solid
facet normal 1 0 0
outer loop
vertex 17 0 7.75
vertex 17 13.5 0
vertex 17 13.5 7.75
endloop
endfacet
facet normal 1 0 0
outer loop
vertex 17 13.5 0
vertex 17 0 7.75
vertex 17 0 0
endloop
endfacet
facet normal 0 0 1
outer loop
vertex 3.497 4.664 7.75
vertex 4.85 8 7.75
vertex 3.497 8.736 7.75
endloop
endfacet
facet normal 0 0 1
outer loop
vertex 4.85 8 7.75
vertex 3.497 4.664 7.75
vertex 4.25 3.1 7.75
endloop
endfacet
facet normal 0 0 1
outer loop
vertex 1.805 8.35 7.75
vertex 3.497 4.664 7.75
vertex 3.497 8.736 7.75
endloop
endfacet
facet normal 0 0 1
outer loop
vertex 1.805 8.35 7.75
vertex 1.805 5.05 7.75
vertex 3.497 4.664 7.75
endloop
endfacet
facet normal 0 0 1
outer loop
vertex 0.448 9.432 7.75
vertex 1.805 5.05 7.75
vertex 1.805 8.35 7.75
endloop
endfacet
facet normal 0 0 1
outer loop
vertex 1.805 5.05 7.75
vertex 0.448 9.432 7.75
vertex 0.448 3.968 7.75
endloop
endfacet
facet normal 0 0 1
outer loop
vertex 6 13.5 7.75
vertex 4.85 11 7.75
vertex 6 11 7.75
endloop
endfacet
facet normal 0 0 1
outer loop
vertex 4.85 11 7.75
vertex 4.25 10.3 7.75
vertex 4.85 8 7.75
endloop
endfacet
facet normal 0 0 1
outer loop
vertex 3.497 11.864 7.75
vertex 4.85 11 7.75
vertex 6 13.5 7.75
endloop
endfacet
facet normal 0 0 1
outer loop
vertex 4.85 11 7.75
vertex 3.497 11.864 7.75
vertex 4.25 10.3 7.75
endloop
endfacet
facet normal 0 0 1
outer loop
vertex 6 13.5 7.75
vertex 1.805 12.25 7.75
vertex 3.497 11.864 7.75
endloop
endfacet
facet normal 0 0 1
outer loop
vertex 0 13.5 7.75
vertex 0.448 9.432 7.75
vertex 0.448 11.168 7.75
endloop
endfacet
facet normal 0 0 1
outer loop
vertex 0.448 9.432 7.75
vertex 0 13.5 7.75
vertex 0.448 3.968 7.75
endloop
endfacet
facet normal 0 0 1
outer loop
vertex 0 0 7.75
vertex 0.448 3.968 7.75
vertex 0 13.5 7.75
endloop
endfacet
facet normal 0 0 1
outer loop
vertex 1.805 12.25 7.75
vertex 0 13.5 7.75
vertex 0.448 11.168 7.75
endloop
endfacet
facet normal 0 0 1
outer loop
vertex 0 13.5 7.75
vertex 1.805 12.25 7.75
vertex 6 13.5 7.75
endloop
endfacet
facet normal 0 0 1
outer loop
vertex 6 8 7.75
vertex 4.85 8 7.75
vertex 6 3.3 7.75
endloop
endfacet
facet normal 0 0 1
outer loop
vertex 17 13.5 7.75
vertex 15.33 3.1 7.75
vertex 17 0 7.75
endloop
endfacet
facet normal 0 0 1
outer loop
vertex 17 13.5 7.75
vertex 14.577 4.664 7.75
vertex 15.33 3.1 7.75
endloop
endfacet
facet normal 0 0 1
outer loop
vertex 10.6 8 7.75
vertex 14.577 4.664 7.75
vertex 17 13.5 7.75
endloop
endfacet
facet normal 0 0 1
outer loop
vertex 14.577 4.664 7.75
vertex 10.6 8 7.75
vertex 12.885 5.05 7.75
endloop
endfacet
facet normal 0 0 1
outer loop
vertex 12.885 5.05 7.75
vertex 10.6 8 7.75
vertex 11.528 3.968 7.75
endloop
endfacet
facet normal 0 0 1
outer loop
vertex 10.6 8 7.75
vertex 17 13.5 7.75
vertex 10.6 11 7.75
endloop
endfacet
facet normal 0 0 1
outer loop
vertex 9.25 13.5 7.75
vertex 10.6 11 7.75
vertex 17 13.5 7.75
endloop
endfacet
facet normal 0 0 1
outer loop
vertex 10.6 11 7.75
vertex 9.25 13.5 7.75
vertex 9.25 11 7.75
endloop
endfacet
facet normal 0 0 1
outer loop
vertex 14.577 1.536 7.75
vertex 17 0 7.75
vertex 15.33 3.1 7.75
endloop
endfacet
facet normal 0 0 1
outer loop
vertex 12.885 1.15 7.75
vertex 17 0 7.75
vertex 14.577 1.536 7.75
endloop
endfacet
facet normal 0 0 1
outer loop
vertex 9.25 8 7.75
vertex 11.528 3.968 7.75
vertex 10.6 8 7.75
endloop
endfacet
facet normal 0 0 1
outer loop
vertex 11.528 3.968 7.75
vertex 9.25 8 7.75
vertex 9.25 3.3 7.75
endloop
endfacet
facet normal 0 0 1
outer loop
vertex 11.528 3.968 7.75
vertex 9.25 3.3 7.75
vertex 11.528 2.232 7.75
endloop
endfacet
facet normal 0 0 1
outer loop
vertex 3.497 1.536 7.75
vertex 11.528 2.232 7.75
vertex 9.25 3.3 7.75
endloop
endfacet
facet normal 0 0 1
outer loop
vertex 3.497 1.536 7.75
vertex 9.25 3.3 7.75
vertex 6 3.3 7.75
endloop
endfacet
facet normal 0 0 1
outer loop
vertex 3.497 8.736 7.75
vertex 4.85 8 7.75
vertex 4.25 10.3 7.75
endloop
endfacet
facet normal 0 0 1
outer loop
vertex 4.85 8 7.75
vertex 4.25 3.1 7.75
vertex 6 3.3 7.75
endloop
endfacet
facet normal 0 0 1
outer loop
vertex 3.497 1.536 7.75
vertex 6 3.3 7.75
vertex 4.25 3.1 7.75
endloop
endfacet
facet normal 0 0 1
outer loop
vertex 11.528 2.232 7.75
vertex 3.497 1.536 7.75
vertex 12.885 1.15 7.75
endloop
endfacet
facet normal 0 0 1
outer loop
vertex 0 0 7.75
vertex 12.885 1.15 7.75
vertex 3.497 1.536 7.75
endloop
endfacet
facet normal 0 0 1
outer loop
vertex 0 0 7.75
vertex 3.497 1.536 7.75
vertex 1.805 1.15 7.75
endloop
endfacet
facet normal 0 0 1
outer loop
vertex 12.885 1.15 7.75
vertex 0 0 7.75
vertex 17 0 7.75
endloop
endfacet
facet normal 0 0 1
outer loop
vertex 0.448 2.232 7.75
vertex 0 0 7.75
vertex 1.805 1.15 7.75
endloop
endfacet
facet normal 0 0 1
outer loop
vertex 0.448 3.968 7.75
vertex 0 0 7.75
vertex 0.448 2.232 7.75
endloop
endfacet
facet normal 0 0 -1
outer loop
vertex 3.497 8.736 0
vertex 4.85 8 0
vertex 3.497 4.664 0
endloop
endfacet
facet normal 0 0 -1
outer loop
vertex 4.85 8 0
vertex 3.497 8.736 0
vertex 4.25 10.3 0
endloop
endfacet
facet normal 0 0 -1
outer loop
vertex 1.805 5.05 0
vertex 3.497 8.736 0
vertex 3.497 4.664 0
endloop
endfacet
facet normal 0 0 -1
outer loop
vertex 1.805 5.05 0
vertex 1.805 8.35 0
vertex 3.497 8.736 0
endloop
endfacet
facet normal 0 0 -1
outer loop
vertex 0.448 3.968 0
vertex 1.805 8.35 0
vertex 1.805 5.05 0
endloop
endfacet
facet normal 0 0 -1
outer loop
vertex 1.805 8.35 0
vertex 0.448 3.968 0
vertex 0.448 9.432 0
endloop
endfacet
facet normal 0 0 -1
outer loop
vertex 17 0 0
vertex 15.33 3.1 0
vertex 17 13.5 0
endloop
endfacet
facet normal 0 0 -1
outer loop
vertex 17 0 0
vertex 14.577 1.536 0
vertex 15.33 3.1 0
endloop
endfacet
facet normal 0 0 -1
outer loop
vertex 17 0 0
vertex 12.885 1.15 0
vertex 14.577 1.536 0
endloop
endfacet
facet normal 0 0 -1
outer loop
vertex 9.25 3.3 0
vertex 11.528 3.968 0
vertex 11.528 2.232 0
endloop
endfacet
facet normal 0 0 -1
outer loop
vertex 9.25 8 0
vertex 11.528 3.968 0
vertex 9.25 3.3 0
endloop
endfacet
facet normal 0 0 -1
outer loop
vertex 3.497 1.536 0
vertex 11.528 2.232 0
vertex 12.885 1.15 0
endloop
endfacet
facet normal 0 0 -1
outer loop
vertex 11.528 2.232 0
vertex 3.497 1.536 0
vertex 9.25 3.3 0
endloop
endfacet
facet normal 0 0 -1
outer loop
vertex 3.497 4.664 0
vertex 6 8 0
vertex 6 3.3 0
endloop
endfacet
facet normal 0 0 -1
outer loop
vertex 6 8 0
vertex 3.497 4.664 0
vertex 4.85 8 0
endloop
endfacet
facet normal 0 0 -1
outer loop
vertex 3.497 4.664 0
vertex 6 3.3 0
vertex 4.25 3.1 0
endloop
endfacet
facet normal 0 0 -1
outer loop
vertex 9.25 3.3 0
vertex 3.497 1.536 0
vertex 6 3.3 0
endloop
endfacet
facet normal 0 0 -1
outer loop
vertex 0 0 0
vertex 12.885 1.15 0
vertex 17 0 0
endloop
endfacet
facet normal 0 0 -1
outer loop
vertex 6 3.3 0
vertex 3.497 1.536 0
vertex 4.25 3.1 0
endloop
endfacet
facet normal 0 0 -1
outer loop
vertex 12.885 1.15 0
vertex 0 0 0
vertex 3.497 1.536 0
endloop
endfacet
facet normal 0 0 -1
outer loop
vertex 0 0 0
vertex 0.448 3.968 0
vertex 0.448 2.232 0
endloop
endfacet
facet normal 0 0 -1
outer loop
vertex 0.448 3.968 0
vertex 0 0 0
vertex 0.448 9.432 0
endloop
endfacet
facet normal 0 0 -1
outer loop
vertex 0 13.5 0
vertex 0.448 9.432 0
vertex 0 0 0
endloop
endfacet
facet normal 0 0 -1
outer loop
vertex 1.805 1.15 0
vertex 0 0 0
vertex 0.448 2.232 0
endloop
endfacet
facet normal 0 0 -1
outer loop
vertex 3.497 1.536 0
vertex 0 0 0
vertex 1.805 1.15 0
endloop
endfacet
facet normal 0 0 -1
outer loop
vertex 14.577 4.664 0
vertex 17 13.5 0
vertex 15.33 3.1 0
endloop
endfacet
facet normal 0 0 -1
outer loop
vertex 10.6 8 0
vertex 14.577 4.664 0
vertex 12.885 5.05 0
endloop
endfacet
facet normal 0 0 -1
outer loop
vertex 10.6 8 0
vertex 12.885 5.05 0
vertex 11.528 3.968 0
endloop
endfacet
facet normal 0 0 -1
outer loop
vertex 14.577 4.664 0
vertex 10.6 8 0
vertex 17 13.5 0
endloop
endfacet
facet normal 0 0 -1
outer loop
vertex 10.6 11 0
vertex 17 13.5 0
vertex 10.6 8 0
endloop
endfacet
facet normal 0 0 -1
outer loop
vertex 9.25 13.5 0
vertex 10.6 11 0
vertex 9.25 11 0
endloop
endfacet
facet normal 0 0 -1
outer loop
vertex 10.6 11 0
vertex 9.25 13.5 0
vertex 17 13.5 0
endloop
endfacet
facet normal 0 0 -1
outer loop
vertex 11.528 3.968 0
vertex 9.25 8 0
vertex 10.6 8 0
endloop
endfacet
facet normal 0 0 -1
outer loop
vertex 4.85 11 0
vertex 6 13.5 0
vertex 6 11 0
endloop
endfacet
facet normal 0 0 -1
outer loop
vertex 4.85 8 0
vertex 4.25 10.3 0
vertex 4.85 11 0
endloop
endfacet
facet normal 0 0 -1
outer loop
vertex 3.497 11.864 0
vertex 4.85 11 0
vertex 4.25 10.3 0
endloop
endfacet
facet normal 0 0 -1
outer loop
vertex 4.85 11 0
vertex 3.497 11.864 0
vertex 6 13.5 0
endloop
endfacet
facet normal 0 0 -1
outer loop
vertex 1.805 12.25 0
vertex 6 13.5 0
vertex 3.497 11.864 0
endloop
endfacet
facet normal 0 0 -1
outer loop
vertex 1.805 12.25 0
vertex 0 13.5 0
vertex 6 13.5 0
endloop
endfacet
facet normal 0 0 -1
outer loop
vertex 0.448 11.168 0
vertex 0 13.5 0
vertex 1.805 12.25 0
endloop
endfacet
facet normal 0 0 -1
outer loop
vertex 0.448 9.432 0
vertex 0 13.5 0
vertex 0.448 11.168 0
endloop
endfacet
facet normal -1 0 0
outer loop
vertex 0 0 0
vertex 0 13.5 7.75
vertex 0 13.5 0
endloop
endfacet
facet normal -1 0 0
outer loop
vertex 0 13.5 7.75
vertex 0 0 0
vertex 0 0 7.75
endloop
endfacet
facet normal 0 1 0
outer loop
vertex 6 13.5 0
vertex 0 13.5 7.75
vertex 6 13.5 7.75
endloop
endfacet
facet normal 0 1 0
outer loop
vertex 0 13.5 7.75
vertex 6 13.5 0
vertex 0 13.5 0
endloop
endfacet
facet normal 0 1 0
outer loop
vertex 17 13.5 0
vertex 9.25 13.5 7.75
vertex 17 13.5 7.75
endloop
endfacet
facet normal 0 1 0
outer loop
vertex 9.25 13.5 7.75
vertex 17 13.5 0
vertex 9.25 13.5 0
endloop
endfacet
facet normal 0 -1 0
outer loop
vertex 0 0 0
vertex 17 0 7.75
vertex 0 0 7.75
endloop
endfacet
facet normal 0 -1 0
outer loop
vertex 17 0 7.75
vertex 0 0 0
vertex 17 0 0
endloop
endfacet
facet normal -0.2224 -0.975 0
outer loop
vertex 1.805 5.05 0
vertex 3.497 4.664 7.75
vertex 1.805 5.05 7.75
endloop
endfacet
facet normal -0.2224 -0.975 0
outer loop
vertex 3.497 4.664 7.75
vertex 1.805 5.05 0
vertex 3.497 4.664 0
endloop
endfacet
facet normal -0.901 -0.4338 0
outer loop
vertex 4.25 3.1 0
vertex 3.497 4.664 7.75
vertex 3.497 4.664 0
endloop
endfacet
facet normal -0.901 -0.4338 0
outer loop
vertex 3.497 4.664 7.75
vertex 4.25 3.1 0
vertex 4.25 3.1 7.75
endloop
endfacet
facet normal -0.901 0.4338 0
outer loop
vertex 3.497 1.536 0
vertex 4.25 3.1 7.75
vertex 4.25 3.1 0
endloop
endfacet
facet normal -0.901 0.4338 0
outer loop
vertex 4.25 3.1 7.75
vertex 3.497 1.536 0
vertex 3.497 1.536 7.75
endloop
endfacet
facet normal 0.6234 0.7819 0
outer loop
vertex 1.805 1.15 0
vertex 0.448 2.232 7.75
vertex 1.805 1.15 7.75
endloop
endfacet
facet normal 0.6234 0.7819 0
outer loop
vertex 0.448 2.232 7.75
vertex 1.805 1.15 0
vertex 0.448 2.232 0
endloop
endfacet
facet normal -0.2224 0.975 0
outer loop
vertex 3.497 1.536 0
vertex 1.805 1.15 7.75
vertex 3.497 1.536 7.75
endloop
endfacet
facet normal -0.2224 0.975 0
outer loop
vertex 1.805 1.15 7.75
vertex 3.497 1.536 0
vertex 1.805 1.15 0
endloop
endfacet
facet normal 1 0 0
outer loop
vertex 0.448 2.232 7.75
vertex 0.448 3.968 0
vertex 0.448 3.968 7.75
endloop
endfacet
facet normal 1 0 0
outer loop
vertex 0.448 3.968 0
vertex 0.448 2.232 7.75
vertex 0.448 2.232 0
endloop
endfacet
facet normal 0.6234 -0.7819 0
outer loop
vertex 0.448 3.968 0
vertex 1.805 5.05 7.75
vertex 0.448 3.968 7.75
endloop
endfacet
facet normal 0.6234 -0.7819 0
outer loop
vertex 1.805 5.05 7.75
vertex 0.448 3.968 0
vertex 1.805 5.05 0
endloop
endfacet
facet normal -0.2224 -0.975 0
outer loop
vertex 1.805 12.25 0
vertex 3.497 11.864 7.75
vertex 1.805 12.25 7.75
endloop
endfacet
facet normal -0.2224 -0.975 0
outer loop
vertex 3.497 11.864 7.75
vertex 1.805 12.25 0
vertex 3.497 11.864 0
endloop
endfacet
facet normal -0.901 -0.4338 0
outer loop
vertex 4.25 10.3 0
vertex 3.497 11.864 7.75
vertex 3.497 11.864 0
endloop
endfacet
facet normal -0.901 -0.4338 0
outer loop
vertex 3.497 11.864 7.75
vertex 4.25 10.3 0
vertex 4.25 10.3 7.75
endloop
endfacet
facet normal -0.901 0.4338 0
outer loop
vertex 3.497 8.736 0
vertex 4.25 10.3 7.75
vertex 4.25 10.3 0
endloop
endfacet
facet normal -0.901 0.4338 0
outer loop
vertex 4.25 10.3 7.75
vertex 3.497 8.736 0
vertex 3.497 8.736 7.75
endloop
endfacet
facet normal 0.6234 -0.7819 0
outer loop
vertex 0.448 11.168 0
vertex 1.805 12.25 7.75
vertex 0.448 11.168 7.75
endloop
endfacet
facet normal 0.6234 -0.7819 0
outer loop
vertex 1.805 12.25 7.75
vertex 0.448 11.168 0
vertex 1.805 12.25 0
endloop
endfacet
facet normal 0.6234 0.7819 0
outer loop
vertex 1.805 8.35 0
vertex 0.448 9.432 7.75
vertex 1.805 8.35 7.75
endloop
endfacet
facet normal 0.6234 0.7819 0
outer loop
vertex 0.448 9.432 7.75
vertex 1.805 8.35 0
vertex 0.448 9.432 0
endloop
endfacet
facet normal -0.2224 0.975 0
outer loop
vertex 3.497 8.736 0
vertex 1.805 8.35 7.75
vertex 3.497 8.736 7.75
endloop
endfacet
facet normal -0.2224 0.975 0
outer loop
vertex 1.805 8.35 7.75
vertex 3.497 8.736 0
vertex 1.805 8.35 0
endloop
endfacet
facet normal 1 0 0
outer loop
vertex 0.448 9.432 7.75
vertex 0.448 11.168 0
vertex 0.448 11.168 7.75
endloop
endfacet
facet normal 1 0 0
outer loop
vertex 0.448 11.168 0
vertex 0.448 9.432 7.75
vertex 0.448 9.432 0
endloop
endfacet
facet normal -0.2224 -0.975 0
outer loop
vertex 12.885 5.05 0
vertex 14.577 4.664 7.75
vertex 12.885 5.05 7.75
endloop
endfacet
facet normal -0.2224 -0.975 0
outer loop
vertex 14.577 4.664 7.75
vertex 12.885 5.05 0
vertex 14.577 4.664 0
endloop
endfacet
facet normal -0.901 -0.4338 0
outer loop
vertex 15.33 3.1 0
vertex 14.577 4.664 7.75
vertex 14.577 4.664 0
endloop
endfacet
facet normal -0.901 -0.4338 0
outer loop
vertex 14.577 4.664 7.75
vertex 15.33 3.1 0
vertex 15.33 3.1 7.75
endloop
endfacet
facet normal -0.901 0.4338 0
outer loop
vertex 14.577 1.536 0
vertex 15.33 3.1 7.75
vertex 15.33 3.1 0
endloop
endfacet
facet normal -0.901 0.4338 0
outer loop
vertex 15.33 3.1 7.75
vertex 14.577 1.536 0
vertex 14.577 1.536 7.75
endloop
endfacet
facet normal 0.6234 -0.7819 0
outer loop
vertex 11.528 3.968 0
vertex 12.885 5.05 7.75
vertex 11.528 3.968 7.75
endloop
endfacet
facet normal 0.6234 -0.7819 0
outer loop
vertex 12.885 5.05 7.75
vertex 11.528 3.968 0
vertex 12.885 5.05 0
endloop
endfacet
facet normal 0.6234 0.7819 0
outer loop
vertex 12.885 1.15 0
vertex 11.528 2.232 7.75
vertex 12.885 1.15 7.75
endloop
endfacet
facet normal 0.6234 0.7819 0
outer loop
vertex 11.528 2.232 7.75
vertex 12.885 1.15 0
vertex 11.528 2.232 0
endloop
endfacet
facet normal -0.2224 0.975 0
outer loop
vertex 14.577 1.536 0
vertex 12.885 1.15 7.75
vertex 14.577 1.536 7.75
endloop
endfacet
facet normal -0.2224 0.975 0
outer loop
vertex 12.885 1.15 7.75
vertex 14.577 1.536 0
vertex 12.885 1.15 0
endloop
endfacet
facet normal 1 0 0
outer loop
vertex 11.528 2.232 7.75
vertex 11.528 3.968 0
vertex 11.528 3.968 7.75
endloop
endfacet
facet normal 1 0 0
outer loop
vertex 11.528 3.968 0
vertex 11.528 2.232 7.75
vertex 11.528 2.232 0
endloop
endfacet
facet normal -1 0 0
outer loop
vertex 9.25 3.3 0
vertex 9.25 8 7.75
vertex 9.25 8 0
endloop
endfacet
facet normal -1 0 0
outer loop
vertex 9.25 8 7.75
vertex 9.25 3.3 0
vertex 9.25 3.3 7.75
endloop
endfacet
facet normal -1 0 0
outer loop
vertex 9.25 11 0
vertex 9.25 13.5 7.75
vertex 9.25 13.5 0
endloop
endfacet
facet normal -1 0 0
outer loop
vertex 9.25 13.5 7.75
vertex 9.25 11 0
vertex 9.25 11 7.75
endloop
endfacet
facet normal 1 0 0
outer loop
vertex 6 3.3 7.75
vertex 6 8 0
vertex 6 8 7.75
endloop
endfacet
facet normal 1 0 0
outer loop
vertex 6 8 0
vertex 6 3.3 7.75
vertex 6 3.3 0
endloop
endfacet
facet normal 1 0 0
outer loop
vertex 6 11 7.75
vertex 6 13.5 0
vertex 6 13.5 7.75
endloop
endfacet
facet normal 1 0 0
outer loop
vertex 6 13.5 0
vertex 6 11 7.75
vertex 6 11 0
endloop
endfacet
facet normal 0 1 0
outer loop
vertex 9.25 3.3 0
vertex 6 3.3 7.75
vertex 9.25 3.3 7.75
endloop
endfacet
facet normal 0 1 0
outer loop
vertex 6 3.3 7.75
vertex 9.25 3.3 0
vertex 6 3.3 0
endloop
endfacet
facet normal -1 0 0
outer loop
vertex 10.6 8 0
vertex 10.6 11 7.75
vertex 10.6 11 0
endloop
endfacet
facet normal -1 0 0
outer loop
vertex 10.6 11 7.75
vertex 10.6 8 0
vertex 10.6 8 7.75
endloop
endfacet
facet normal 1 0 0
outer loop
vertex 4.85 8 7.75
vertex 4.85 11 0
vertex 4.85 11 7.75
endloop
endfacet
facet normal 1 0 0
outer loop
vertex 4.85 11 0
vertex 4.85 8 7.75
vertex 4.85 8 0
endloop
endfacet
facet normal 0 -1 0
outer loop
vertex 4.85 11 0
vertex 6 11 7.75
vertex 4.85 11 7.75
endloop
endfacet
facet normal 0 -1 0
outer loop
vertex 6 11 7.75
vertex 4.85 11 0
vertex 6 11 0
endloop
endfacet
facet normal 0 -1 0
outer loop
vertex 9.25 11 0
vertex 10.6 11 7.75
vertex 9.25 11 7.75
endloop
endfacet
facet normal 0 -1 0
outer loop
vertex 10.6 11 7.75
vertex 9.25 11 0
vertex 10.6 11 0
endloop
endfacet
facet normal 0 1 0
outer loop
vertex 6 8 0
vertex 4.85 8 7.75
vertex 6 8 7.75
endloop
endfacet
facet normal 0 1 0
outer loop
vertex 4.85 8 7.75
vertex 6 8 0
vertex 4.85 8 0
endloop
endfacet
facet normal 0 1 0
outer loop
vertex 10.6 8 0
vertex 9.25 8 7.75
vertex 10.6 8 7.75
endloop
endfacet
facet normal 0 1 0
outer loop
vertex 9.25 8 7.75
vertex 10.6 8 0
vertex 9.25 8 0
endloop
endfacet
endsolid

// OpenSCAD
module prusa_carriage_belt_grip() {
    difference() {
        cube( [17, 13.5, 7.75] );
        translate( [2.25, 3.10, 0] ) {
            cylinder( d=4, h=7.75 );
        }
        translate( [2.25, 10.3, 0] ) {
            cylinder( d=4, h=7.75 );
        }
        translate( [13.33, 3.10, 0] ) {
            cylinder( d=4, h=7.75 );
        }
        translate( [6, 3.30, 0] ) {
            cube( [3.25, 10.25, 7.75] );
        }
        translate( [4.85, 8, 0] ) {
            cube( [5.75, 3, 7.75] );
        }
    }
}

prusa_carriage_belt_grip();
